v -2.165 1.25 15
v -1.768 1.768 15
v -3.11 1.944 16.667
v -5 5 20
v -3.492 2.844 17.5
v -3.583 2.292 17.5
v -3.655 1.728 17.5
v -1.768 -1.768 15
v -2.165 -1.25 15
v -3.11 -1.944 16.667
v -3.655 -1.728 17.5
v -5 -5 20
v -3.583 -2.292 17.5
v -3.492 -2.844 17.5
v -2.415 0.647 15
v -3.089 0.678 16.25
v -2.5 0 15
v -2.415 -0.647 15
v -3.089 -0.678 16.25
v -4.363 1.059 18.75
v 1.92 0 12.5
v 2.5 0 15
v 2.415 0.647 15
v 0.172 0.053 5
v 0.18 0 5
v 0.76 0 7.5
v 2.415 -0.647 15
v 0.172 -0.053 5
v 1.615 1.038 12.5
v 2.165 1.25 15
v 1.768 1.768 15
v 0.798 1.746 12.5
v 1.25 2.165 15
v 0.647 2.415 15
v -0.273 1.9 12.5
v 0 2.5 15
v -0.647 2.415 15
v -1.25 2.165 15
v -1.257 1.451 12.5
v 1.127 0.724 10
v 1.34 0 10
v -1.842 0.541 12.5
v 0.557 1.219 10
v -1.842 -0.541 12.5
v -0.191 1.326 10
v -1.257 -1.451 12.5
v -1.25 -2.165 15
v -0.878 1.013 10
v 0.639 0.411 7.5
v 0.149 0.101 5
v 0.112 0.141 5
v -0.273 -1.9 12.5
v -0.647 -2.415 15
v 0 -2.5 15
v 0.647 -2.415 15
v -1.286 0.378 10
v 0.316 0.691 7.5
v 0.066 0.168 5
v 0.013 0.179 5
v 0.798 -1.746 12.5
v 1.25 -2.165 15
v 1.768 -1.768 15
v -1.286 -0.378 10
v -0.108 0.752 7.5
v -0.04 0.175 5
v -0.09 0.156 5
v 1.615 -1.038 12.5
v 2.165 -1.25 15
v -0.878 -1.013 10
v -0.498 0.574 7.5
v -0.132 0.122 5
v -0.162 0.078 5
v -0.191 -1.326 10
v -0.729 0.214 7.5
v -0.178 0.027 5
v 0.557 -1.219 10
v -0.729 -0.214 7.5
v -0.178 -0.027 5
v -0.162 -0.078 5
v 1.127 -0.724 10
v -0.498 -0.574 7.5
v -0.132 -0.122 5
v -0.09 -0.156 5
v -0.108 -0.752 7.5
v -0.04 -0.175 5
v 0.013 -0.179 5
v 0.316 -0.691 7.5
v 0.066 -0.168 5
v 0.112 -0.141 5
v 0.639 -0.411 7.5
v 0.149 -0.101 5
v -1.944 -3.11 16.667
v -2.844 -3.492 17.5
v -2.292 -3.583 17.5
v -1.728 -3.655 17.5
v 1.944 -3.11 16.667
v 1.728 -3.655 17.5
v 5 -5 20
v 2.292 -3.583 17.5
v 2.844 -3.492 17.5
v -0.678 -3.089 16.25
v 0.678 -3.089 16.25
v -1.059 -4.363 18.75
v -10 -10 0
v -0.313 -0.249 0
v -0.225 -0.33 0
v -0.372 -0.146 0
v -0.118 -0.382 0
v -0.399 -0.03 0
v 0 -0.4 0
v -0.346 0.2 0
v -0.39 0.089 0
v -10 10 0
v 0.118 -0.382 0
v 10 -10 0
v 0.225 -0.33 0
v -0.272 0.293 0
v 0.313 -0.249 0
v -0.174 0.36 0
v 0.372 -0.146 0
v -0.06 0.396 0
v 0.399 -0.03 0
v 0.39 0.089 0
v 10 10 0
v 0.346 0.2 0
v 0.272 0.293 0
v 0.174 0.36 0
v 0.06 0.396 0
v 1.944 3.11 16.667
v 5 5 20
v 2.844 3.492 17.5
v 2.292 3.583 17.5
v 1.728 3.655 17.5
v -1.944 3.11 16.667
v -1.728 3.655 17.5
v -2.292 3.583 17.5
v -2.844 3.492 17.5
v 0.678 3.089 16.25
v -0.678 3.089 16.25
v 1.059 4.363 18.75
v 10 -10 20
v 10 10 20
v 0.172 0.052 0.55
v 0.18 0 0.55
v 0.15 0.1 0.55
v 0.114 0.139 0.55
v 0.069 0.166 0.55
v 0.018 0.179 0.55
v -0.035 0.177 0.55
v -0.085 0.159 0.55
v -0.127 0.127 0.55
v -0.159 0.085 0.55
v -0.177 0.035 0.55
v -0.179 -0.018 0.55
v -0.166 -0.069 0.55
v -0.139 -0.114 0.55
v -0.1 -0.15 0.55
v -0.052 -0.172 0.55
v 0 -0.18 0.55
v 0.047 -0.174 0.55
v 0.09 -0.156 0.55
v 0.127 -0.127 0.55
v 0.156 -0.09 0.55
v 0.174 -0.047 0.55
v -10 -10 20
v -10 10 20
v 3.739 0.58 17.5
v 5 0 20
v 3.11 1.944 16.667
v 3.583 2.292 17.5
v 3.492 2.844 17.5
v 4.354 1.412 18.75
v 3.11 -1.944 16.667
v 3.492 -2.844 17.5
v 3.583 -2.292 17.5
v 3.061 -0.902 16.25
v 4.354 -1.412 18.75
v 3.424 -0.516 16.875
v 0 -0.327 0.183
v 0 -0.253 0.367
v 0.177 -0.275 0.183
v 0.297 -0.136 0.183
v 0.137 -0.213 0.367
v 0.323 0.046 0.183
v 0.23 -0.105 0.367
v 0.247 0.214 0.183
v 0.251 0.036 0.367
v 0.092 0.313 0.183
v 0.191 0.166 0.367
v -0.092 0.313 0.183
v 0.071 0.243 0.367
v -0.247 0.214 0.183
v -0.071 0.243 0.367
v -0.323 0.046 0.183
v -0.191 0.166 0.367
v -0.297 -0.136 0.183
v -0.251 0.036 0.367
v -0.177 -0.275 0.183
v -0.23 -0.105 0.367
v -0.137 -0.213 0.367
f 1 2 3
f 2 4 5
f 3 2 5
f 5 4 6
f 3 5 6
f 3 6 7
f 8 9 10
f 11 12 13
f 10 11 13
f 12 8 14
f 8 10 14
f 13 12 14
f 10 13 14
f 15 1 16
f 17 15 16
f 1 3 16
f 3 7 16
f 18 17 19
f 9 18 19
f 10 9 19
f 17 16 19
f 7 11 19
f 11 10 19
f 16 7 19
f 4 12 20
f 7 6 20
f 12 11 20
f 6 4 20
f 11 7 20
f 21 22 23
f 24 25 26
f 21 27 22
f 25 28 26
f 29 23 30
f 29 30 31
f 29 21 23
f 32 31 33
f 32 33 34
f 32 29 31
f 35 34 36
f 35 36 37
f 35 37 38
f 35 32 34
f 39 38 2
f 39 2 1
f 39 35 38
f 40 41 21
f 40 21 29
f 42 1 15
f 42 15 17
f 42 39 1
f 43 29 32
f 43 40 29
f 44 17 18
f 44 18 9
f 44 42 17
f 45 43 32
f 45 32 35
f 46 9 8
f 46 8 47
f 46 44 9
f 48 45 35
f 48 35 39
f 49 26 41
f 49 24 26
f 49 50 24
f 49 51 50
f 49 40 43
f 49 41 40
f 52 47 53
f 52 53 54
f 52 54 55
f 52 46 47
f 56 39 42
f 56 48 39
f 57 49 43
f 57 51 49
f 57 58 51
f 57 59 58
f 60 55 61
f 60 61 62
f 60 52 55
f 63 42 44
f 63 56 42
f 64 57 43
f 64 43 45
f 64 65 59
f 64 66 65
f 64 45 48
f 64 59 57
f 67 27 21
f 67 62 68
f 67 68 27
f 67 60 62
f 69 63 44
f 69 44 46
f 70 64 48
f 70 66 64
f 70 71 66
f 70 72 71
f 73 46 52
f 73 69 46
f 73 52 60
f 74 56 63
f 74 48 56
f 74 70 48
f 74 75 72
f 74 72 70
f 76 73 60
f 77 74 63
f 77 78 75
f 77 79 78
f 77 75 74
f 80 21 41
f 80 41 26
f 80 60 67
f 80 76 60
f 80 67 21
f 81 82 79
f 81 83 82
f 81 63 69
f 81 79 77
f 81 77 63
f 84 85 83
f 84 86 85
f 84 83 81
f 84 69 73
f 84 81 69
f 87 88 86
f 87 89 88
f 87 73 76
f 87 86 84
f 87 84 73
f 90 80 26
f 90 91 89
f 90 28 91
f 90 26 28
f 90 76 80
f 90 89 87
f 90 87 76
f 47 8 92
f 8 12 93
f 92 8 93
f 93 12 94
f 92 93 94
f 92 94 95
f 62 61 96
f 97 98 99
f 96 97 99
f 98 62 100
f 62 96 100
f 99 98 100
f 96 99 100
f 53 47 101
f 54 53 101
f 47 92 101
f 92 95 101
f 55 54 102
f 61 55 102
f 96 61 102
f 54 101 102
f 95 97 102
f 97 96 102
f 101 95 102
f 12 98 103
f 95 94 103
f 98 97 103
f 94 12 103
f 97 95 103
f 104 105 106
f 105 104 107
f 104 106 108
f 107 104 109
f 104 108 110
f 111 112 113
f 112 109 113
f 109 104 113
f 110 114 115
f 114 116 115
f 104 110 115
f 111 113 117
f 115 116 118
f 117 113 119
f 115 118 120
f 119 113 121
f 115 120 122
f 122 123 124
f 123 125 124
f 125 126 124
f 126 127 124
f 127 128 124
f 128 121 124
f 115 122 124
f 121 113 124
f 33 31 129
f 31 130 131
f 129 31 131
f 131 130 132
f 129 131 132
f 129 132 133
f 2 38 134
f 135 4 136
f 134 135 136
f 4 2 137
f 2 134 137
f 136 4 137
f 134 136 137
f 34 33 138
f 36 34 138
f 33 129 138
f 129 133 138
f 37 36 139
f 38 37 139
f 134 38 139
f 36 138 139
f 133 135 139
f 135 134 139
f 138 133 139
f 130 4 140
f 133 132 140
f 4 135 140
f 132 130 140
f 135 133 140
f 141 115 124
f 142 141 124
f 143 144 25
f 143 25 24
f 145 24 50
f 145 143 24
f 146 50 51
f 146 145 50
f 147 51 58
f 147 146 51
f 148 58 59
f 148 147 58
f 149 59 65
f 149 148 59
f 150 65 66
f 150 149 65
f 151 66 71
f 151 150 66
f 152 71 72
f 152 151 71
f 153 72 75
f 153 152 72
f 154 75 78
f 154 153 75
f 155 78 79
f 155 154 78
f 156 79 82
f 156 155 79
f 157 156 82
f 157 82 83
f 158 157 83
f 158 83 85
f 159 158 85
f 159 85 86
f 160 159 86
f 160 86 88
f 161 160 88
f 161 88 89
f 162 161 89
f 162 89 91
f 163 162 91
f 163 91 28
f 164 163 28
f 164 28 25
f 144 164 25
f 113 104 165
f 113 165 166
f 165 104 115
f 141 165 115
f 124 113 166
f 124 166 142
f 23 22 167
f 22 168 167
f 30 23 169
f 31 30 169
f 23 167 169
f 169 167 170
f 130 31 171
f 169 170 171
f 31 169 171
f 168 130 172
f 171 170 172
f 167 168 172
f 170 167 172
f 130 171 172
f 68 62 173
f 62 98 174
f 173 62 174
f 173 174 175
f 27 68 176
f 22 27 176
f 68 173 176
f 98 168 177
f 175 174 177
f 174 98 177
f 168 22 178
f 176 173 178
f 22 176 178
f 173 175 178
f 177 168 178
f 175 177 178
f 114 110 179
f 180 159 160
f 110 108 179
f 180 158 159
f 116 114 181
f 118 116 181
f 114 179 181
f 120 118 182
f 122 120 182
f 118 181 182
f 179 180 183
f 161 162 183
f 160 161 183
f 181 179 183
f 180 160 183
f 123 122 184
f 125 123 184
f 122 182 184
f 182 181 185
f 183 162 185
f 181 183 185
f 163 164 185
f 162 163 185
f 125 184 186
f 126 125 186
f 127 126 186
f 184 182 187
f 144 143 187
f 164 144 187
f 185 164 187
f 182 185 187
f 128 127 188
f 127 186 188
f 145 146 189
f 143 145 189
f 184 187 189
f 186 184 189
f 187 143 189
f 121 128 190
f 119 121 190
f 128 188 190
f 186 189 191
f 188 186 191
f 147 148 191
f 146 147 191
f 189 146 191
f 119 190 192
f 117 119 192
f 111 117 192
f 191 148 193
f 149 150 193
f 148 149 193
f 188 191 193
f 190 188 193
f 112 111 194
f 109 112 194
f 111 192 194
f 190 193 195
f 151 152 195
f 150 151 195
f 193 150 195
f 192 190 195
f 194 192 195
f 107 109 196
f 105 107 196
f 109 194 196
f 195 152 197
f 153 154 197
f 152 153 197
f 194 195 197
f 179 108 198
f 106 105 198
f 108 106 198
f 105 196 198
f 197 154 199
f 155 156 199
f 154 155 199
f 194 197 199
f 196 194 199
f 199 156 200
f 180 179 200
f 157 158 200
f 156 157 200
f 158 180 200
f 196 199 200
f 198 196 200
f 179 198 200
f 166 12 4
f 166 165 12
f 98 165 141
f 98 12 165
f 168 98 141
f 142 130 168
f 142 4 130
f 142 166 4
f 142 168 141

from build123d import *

# Parameters (mm, degrees)
F0_W     = 20
F0_H     = 20
F0_R     = 0.18
F1_DEPTH = 20
F4_R     = 2.5
F2_W     = 10
F2_H     = 10
F6_R     = 0.18


with BuildPart() as f1:
    # F0 (on Top) → F1 (new body)
    with BuildSketch(Plane.XY):
        Rectangle(F0_W, F0_H)
        Circle(F0_R, mode=Mode.SUBTRACT)
    extrude(amount=F1_DEPTH)

    # F4 (on offset) → F7 section 0
    with BuildSketch(Plane.XY.offset(15)):
        Circle(F4_R)
    # F2 (on face) → F7 section 1
    with BuildSketch(Plane.XY.offset(20)):
        Rectangle(F2_W, F2_H)
    loft(mode=Mode.SUBTRACT)

    # F4 (on offset) → F8 section 0
    with BuildSketch(Plane.XY.offset(15)):
        Circle(F4_R)
    # F6 (on offset) → F8 section 1
    with BuildSketch(Plane.XY.offset(5)):
        Circle(F6_R)
    loft(mode=Mode.SUBTRACT)

    # F10 (on offset) → F11 (revolve, cut)
    with BuildSketch(Plane(origin=(0, 0, 0), x_dir=(0, -1, 0), z_dir=(-1, 0, 0))):
        Polygon((0.4, 0), (0, 1), (0, 0), align=None)
    revolve(axis=Axis((0, 0, 0.5), (0, 0, 1)), mode=Mode.SUBTRACT)


solid = f1.part
